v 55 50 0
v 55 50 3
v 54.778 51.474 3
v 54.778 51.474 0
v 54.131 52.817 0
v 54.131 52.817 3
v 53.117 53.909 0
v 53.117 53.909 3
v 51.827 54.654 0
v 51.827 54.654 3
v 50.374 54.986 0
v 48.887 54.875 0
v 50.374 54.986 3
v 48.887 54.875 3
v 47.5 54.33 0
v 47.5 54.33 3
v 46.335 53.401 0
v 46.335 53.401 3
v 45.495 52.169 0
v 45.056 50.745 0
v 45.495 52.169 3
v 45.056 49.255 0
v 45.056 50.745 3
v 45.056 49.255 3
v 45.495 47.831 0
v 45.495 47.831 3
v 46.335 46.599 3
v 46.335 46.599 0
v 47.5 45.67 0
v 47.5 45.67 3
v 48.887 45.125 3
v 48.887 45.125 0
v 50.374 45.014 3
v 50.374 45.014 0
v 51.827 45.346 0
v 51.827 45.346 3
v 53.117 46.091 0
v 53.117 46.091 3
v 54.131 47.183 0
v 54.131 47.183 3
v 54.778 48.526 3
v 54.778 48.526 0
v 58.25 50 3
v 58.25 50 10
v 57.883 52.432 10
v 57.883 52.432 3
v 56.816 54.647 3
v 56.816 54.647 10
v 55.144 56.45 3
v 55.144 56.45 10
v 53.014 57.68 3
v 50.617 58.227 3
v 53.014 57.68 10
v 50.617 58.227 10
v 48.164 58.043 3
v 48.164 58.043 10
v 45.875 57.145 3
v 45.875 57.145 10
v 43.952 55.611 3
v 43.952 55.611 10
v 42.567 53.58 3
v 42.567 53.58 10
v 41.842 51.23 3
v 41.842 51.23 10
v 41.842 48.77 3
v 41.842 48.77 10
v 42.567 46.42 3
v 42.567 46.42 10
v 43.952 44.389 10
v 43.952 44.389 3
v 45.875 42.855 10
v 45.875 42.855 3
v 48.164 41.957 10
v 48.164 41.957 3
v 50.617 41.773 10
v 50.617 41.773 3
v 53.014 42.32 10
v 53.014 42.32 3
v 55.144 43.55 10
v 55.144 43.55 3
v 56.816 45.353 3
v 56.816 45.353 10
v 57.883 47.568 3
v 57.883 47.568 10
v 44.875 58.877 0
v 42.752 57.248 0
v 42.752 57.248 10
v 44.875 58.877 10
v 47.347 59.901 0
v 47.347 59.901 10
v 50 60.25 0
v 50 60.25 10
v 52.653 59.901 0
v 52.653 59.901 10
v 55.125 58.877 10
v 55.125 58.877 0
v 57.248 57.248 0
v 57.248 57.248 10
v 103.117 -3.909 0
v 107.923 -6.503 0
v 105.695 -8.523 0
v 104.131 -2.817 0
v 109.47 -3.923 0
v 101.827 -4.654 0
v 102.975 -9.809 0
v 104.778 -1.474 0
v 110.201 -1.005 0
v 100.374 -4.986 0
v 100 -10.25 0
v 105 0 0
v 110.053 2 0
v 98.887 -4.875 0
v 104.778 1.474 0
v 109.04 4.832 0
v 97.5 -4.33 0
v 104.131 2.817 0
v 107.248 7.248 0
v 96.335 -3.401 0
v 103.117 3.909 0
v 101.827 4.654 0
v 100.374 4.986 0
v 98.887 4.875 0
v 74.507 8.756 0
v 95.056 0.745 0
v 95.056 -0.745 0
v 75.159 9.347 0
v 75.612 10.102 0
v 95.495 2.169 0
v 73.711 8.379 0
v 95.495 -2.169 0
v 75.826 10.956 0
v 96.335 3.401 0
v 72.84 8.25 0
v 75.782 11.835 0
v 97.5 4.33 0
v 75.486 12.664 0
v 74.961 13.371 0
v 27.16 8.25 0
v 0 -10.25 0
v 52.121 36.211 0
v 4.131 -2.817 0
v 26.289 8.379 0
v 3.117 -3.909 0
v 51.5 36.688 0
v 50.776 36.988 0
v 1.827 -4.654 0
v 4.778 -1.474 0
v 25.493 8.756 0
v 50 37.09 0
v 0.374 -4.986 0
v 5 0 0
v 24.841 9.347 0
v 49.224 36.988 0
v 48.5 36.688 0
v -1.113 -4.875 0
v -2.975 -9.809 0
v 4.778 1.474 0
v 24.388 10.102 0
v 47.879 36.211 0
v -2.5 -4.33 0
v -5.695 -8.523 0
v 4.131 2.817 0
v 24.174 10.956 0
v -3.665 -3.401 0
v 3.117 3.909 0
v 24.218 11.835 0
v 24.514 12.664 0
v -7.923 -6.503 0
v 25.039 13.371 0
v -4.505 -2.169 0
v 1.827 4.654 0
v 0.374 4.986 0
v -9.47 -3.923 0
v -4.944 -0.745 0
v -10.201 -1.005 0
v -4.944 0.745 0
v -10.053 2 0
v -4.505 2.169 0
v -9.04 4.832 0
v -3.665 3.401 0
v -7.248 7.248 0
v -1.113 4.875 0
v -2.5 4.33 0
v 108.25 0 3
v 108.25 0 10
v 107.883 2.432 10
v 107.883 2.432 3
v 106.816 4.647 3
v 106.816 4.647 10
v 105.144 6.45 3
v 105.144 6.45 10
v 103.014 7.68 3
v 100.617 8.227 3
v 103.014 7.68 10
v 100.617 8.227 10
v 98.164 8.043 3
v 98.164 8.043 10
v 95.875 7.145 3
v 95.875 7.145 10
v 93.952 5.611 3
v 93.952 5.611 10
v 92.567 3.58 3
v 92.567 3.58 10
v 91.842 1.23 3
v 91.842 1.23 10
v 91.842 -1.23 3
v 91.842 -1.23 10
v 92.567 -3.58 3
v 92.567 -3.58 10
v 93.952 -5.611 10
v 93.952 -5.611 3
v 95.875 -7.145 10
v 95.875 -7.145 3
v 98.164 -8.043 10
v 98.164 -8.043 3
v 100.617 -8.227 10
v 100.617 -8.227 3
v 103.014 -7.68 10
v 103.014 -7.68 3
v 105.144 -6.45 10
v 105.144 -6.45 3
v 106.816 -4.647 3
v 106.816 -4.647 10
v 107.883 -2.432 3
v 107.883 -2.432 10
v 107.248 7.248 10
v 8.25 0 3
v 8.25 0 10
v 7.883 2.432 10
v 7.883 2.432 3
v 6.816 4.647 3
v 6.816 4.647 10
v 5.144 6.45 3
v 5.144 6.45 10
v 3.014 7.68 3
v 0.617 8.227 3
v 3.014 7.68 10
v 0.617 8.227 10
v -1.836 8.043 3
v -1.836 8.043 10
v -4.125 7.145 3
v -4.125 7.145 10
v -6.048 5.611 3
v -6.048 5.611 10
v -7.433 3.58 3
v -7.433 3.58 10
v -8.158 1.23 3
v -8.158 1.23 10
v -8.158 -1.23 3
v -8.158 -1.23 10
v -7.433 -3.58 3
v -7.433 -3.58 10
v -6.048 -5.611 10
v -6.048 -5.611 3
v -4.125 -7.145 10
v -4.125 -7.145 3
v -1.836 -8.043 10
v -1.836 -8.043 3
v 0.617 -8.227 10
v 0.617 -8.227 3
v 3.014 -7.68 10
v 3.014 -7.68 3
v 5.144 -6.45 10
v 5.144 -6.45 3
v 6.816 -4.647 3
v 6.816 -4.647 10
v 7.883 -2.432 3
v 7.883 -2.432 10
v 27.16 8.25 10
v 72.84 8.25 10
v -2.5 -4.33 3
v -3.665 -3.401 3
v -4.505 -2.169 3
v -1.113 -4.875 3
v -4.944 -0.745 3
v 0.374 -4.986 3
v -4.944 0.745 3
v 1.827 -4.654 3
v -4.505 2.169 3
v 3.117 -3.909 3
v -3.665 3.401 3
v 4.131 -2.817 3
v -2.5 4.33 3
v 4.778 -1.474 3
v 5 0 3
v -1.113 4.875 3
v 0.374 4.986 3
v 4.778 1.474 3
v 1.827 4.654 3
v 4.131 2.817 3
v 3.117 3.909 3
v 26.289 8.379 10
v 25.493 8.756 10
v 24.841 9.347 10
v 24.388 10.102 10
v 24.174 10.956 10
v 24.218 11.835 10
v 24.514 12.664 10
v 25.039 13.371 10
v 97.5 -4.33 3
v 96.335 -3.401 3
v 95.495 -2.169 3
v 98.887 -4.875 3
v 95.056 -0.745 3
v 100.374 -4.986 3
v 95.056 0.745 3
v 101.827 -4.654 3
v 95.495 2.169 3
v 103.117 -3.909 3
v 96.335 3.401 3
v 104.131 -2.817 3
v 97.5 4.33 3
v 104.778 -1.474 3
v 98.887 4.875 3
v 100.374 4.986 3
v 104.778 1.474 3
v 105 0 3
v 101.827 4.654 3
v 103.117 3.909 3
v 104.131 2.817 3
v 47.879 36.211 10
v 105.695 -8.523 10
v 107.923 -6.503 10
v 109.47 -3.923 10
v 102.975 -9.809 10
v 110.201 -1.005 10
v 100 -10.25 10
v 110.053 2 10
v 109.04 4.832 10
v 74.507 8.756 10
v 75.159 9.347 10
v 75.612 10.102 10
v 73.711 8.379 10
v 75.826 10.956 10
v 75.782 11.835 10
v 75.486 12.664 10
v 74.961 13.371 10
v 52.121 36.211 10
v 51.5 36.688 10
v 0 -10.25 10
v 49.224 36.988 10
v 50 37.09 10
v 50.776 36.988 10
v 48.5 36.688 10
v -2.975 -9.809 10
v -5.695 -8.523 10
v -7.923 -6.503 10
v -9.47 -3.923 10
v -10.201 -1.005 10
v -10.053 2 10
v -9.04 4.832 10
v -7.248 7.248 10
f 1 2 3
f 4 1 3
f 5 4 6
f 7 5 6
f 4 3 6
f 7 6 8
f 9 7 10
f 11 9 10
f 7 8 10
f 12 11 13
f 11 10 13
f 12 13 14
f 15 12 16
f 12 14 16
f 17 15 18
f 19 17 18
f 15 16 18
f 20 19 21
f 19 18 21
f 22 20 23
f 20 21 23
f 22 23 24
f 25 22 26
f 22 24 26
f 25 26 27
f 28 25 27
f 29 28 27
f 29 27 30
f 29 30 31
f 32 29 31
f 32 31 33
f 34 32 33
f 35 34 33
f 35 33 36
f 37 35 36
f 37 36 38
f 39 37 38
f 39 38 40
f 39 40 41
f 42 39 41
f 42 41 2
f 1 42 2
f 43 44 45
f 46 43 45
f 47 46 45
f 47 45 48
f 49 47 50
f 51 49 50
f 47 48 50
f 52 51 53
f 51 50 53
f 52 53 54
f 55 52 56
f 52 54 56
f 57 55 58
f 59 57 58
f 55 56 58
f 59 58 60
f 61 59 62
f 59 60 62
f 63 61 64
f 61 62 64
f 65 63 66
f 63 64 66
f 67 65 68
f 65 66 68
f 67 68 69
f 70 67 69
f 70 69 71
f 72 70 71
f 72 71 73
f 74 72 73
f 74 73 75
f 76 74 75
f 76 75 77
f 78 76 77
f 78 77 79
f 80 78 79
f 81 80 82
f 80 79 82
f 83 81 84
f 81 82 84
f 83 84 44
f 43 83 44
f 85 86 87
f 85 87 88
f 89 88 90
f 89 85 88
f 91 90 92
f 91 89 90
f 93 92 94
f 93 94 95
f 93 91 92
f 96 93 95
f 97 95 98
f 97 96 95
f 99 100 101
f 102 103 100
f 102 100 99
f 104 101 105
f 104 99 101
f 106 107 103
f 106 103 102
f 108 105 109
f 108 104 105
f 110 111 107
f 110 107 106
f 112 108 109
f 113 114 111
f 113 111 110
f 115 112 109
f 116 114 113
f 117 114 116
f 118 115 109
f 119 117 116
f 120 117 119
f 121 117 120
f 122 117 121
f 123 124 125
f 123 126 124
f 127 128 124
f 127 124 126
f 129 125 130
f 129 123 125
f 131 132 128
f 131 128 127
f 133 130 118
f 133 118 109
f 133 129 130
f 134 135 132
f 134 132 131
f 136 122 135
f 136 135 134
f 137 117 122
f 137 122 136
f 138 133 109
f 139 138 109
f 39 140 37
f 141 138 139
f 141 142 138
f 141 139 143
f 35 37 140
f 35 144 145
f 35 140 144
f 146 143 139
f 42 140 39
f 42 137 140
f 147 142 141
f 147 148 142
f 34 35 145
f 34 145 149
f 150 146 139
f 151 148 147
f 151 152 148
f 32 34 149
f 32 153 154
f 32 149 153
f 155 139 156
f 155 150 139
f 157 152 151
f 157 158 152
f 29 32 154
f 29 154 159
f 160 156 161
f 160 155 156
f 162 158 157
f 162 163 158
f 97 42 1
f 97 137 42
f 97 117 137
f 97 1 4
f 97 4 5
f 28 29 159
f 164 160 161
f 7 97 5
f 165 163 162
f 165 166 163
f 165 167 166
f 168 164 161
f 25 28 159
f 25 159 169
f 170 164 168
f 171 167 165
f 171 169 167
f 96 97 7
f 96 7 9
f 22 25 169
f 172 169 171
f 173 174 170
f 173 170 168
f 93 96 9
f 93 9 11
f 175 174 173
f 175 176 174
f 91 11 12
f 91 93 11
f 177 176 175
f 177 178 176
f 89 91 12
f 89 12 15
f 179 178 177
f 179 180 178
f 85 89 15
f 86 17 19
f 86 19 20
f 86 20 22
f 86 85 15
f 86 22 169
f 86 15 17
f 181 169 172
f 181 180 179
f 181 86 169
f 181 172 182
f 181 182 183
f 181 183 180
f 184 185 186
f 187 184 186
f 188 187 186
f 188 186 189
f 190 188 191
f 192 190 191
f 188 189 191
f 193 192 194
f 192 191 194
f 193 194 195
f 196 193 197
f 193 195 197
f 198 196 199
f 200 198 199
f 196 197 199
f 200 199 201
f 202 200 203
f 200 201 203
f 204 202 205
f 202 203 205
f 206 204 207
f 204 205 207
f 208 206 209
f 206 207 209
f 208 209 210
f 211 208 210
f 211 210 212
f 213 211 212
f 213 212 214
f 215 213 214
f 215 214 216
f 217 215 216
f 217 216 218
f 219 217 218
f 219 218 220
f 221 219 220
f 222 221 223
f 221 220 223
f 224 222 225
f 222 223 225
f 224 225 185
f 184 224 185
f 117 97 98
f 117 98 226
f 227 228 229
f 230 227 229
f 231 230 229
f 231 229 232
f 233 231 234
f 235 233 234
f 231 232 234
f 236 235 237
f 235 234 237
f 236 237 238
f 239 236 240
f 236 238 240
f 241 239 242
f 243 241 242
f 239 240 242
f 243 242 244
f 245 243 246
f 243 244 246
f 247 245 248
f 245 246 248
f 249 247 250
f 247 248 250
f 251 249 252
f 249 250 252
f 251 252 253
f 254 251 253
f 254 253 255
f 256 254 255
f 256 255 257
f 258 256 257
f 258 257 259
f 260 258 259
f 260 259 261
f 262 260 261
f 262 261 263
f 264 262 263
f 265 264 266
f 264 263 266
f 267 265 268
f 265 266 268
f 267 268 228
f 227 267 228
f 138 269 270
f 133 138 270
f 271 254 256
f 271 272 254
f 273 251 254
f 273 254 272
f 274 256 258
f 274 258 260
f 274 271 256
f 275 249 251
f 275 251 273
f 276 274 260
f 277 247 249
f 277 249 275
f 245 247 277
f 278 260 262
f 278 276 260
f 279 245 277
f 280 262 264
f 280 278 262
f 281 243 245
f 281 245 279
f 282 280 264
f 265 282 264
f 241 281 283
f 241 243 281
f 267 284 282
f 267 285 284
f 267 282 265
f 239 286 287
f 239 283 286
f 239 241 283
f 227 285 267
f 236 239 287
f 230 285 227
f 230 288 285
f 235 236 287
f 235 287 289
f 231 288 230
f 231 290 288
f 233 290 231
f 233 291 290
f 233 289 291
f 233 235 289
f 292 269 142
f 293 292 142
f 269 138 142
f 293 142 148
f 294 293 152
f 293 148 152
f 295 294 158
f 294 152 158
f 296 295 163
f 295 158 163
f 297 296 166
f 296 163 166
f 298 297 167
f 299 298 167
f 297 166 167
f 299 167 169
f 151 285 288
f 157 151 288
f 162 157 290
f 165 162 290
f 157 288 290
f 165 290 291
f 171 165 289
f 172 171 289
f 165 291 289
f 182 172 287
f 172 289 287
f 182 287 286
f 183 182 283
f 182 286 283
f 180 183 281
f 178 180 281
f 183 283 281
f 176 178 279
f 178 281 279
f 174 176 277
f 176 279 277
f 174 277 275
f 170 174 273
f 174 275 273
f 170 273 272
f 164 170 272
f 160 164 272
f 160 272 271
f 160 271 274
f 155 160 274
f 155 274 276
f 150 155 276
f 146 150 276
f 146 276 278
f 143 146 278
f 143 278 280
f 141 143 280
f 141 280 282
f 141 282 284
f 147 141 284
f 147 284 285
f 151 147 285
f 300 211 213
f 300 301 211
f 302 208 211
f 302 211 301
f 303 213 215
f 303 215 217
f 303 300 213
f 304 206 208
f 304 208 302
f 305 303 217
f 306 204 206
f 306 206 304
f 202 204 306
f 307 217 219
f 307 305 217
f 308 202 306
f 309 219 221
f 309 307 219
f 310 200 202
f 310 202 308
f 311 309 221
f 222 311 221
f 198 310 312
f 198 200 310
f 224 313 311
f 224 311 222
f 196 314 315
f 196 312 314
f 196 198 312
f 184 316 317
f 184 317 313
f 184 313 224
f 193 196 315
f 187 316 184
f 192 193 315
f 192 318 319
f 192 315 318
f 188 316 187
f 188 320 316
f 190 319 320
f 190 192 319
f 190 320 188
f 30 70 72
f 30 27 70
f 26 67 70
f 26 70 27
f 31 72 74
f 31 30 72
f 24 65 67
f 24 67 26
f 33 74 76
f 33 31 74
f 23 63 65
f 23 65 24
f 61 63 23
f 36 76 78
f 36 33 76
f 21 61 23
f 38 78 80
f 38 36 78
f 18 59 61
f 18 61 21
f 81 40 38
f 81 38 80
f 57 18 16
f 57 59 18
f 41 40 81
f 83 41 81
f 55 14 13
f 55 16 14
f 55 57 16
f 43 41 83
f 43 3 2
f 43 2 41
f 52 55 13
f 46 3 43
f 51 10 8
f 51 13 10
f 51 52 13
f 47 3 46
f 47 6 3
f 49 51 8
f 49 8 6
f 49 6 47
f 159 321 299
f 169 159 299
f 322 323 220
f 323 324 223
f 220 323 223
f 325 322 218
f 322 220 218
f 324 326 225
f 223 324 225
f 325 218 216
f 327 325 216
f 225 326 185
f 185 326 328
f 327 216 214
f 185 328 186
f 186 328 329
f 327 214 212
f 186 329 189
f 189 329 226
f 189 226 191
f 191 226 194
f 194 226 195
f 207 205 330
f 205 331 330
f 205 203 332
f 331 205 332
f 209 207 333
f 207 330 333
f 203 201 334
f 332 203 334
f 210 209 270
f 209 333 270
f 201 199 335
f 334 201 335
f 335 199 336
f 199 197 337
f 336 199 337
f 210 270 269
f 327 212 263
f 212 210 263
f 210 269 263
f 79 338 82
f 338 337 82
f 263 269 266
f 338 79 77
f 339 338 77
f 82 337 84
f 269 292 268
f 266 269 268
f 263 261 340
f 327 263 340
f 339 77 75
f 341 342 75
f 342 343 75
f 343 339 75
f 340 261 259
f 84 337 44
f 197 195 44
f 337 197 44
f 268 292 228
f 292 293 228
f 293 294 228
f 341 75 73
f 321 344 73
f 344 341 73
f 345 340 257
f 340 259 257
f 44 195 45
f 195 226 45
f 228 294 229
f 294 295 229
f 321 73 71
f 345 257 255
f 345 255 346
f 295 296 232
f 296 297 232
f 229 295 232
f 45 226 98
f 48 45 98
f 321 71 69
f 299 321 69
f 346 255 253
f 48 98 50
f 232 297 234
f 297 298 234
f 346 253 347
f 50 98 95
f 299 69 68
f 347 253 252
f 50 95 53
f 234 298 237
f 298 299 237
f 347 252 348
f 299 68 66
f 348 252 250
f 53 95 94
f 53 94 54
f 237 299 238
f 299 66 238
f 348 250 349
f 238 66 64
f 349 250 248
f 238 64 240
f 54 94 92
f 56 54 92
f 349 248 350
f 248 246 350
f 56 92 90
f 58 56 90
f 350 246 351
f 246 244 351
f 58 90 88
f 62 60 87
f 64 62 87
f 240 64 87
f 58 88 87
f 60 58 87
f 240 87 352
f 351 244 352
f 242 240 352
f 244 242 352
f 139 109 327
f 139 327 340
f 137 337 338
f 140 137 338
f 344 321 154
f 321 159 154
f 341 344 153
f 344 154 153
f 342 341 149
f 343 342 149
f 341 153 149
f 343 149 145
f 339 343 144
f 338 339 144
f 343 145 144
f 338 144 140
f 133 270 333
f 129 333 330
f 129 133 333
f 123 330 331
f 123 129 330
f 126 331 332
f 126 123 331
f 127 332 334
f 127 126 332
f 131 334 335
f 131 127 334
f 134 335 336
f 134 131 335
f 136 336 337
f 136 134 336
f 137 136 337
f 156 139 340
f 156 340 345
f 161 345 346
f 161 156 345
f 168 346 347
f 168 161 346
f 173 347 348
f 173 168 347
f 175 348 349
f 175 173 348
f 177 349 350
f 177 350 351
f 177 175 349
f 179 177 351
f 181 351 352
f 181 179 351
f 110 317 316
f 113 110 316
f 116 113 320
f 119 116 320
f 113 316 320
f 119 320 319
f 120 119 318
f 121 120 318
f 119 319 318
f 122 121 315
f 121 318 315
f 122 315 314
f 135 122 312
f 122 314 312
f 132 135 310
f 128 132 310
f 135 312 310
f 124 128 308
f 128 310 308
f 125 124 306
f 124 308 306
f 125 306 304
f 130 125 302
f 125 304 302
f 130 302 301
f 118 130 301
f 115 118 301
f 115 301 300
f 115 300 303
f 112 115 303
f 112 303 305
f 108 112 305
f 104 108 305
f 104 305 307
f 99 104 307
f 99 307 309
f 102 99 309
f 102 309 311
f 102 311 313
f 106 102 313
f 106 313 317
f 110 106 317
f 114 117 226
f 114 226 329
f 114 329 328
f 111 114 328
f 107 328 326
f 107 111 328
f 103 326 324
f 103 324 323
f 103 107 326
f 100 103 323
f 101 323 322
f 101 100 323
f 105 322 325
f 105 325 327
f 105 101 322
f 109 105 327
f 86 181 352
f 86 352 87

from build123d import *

# Parameters (mm, degrees)
BOSS_EXTRUDE1_DEPTH = 10
SKETCH2_R           = 8.25
CUT_EXTRUDE1_DEPTH  = 7
CUT_EXTRUDE2_DEPTH  = 16
FILLET2_R           = 3
SKETCH5_R           = 5
CUT_EXTRUDE3_DEPTH  = 16


with BuildPart() as part:
    # Sketch1 → Boss-Extrude1 (new body)
    with BuildSketch(Plane.XY):
        with BuildLine():
            Line((0, 10.25), (100, 10.25))
            ThreePointArc((100, 10.25), (110.25, 0), (100, -10.25))
            Line((100, -10.25), (0, -10.25))
            ThreePointArc((0, -10.25), (-10.25, 0), (0, 10.25))
        make_face()
        with BuildLine():
            Line((92.752155493, -7.247844507), (42.752155493, 42.752155493))
            ThreePointArc((42.752155493, 42.752155493), (42.752155493, 57.247844507), (57.247844507, 57.247844507))
            Line((57.247844507, 57.247844507), (107.247844507, 7.247844507))
            ThreePointArc((107.247844507, 7.247844507), (107.247844507, -7.247844507), (92.752155493, -7.247844507))
        make_face()
        with BuildLine():
            Line((57.247844507, 42.752155493), (7.247844507, -7.247844507))
            ThreePointArc((7.247844507, -7.247844507), (-7.247844507, -7.247844507), (-7.247844507, 7.247844507))
            Line((-7.247844507, 7.247844507), (42.752155493, 57.247844507))
            ThreePointArc((42.752155493, 57.247844507), (57.247844507, 57.247844507), (57.247844507, 42.752155493))
        make_face()
    extrude(amount=BOSS_EXTRUDE1_DEPTH)

    # Sketch2 → Cut-Extrude1 (cut)
    with BuildSketch(Plane.XY.offset(10)):
        with Locations((50, 50)):
            Circle(SKETCH2_R)
        with Locations((100, 0)):
            Circle(SKETCH2_R)
        Circle(SKETCH2_R)
    extrude(amount=-CUT_EXTRUDE1_DEPTH, mode=Mode.SUBTRACT)

    # Sketch4 → Cut-Extrude2 (cut)
    with BuildSketch(Plane.XY.offset(10)):
        Polygon((19.91726189, 8.25), (80.08273811, 8.25), (50, 38.33273811), align=None)
    extrude(amount=-CUT_EXTRUDE2_DEPTH, mode=Mode.SUBTRACT)

    # Fillet2
    fillet2_edges = [part.edges().sort_by_distance(p)[0] for p in [
        (19.91726189, 8.25, 5),
        (50, 38.33273811, 5),
        (80.08273811, 8.25, 5),
    ]]
    fillet(fillet2_edges, radius=FILLET2_R)

    # Sketch5 → Cut-Extrude3 (cut)
    with BuildSketch(Plane.XY.offset(10)):
        Circle(SKETCH5_R)
        with Locations((50, 50)):
            Circle(SKETCH5_R)
        with Locations((100, 0)):
            Circle(SKETCH5_R)
    extrude(amount=-CUT_EXTRUDE3_DEPTH, mode=Mode.SUBTRACT)


solid = part.part
